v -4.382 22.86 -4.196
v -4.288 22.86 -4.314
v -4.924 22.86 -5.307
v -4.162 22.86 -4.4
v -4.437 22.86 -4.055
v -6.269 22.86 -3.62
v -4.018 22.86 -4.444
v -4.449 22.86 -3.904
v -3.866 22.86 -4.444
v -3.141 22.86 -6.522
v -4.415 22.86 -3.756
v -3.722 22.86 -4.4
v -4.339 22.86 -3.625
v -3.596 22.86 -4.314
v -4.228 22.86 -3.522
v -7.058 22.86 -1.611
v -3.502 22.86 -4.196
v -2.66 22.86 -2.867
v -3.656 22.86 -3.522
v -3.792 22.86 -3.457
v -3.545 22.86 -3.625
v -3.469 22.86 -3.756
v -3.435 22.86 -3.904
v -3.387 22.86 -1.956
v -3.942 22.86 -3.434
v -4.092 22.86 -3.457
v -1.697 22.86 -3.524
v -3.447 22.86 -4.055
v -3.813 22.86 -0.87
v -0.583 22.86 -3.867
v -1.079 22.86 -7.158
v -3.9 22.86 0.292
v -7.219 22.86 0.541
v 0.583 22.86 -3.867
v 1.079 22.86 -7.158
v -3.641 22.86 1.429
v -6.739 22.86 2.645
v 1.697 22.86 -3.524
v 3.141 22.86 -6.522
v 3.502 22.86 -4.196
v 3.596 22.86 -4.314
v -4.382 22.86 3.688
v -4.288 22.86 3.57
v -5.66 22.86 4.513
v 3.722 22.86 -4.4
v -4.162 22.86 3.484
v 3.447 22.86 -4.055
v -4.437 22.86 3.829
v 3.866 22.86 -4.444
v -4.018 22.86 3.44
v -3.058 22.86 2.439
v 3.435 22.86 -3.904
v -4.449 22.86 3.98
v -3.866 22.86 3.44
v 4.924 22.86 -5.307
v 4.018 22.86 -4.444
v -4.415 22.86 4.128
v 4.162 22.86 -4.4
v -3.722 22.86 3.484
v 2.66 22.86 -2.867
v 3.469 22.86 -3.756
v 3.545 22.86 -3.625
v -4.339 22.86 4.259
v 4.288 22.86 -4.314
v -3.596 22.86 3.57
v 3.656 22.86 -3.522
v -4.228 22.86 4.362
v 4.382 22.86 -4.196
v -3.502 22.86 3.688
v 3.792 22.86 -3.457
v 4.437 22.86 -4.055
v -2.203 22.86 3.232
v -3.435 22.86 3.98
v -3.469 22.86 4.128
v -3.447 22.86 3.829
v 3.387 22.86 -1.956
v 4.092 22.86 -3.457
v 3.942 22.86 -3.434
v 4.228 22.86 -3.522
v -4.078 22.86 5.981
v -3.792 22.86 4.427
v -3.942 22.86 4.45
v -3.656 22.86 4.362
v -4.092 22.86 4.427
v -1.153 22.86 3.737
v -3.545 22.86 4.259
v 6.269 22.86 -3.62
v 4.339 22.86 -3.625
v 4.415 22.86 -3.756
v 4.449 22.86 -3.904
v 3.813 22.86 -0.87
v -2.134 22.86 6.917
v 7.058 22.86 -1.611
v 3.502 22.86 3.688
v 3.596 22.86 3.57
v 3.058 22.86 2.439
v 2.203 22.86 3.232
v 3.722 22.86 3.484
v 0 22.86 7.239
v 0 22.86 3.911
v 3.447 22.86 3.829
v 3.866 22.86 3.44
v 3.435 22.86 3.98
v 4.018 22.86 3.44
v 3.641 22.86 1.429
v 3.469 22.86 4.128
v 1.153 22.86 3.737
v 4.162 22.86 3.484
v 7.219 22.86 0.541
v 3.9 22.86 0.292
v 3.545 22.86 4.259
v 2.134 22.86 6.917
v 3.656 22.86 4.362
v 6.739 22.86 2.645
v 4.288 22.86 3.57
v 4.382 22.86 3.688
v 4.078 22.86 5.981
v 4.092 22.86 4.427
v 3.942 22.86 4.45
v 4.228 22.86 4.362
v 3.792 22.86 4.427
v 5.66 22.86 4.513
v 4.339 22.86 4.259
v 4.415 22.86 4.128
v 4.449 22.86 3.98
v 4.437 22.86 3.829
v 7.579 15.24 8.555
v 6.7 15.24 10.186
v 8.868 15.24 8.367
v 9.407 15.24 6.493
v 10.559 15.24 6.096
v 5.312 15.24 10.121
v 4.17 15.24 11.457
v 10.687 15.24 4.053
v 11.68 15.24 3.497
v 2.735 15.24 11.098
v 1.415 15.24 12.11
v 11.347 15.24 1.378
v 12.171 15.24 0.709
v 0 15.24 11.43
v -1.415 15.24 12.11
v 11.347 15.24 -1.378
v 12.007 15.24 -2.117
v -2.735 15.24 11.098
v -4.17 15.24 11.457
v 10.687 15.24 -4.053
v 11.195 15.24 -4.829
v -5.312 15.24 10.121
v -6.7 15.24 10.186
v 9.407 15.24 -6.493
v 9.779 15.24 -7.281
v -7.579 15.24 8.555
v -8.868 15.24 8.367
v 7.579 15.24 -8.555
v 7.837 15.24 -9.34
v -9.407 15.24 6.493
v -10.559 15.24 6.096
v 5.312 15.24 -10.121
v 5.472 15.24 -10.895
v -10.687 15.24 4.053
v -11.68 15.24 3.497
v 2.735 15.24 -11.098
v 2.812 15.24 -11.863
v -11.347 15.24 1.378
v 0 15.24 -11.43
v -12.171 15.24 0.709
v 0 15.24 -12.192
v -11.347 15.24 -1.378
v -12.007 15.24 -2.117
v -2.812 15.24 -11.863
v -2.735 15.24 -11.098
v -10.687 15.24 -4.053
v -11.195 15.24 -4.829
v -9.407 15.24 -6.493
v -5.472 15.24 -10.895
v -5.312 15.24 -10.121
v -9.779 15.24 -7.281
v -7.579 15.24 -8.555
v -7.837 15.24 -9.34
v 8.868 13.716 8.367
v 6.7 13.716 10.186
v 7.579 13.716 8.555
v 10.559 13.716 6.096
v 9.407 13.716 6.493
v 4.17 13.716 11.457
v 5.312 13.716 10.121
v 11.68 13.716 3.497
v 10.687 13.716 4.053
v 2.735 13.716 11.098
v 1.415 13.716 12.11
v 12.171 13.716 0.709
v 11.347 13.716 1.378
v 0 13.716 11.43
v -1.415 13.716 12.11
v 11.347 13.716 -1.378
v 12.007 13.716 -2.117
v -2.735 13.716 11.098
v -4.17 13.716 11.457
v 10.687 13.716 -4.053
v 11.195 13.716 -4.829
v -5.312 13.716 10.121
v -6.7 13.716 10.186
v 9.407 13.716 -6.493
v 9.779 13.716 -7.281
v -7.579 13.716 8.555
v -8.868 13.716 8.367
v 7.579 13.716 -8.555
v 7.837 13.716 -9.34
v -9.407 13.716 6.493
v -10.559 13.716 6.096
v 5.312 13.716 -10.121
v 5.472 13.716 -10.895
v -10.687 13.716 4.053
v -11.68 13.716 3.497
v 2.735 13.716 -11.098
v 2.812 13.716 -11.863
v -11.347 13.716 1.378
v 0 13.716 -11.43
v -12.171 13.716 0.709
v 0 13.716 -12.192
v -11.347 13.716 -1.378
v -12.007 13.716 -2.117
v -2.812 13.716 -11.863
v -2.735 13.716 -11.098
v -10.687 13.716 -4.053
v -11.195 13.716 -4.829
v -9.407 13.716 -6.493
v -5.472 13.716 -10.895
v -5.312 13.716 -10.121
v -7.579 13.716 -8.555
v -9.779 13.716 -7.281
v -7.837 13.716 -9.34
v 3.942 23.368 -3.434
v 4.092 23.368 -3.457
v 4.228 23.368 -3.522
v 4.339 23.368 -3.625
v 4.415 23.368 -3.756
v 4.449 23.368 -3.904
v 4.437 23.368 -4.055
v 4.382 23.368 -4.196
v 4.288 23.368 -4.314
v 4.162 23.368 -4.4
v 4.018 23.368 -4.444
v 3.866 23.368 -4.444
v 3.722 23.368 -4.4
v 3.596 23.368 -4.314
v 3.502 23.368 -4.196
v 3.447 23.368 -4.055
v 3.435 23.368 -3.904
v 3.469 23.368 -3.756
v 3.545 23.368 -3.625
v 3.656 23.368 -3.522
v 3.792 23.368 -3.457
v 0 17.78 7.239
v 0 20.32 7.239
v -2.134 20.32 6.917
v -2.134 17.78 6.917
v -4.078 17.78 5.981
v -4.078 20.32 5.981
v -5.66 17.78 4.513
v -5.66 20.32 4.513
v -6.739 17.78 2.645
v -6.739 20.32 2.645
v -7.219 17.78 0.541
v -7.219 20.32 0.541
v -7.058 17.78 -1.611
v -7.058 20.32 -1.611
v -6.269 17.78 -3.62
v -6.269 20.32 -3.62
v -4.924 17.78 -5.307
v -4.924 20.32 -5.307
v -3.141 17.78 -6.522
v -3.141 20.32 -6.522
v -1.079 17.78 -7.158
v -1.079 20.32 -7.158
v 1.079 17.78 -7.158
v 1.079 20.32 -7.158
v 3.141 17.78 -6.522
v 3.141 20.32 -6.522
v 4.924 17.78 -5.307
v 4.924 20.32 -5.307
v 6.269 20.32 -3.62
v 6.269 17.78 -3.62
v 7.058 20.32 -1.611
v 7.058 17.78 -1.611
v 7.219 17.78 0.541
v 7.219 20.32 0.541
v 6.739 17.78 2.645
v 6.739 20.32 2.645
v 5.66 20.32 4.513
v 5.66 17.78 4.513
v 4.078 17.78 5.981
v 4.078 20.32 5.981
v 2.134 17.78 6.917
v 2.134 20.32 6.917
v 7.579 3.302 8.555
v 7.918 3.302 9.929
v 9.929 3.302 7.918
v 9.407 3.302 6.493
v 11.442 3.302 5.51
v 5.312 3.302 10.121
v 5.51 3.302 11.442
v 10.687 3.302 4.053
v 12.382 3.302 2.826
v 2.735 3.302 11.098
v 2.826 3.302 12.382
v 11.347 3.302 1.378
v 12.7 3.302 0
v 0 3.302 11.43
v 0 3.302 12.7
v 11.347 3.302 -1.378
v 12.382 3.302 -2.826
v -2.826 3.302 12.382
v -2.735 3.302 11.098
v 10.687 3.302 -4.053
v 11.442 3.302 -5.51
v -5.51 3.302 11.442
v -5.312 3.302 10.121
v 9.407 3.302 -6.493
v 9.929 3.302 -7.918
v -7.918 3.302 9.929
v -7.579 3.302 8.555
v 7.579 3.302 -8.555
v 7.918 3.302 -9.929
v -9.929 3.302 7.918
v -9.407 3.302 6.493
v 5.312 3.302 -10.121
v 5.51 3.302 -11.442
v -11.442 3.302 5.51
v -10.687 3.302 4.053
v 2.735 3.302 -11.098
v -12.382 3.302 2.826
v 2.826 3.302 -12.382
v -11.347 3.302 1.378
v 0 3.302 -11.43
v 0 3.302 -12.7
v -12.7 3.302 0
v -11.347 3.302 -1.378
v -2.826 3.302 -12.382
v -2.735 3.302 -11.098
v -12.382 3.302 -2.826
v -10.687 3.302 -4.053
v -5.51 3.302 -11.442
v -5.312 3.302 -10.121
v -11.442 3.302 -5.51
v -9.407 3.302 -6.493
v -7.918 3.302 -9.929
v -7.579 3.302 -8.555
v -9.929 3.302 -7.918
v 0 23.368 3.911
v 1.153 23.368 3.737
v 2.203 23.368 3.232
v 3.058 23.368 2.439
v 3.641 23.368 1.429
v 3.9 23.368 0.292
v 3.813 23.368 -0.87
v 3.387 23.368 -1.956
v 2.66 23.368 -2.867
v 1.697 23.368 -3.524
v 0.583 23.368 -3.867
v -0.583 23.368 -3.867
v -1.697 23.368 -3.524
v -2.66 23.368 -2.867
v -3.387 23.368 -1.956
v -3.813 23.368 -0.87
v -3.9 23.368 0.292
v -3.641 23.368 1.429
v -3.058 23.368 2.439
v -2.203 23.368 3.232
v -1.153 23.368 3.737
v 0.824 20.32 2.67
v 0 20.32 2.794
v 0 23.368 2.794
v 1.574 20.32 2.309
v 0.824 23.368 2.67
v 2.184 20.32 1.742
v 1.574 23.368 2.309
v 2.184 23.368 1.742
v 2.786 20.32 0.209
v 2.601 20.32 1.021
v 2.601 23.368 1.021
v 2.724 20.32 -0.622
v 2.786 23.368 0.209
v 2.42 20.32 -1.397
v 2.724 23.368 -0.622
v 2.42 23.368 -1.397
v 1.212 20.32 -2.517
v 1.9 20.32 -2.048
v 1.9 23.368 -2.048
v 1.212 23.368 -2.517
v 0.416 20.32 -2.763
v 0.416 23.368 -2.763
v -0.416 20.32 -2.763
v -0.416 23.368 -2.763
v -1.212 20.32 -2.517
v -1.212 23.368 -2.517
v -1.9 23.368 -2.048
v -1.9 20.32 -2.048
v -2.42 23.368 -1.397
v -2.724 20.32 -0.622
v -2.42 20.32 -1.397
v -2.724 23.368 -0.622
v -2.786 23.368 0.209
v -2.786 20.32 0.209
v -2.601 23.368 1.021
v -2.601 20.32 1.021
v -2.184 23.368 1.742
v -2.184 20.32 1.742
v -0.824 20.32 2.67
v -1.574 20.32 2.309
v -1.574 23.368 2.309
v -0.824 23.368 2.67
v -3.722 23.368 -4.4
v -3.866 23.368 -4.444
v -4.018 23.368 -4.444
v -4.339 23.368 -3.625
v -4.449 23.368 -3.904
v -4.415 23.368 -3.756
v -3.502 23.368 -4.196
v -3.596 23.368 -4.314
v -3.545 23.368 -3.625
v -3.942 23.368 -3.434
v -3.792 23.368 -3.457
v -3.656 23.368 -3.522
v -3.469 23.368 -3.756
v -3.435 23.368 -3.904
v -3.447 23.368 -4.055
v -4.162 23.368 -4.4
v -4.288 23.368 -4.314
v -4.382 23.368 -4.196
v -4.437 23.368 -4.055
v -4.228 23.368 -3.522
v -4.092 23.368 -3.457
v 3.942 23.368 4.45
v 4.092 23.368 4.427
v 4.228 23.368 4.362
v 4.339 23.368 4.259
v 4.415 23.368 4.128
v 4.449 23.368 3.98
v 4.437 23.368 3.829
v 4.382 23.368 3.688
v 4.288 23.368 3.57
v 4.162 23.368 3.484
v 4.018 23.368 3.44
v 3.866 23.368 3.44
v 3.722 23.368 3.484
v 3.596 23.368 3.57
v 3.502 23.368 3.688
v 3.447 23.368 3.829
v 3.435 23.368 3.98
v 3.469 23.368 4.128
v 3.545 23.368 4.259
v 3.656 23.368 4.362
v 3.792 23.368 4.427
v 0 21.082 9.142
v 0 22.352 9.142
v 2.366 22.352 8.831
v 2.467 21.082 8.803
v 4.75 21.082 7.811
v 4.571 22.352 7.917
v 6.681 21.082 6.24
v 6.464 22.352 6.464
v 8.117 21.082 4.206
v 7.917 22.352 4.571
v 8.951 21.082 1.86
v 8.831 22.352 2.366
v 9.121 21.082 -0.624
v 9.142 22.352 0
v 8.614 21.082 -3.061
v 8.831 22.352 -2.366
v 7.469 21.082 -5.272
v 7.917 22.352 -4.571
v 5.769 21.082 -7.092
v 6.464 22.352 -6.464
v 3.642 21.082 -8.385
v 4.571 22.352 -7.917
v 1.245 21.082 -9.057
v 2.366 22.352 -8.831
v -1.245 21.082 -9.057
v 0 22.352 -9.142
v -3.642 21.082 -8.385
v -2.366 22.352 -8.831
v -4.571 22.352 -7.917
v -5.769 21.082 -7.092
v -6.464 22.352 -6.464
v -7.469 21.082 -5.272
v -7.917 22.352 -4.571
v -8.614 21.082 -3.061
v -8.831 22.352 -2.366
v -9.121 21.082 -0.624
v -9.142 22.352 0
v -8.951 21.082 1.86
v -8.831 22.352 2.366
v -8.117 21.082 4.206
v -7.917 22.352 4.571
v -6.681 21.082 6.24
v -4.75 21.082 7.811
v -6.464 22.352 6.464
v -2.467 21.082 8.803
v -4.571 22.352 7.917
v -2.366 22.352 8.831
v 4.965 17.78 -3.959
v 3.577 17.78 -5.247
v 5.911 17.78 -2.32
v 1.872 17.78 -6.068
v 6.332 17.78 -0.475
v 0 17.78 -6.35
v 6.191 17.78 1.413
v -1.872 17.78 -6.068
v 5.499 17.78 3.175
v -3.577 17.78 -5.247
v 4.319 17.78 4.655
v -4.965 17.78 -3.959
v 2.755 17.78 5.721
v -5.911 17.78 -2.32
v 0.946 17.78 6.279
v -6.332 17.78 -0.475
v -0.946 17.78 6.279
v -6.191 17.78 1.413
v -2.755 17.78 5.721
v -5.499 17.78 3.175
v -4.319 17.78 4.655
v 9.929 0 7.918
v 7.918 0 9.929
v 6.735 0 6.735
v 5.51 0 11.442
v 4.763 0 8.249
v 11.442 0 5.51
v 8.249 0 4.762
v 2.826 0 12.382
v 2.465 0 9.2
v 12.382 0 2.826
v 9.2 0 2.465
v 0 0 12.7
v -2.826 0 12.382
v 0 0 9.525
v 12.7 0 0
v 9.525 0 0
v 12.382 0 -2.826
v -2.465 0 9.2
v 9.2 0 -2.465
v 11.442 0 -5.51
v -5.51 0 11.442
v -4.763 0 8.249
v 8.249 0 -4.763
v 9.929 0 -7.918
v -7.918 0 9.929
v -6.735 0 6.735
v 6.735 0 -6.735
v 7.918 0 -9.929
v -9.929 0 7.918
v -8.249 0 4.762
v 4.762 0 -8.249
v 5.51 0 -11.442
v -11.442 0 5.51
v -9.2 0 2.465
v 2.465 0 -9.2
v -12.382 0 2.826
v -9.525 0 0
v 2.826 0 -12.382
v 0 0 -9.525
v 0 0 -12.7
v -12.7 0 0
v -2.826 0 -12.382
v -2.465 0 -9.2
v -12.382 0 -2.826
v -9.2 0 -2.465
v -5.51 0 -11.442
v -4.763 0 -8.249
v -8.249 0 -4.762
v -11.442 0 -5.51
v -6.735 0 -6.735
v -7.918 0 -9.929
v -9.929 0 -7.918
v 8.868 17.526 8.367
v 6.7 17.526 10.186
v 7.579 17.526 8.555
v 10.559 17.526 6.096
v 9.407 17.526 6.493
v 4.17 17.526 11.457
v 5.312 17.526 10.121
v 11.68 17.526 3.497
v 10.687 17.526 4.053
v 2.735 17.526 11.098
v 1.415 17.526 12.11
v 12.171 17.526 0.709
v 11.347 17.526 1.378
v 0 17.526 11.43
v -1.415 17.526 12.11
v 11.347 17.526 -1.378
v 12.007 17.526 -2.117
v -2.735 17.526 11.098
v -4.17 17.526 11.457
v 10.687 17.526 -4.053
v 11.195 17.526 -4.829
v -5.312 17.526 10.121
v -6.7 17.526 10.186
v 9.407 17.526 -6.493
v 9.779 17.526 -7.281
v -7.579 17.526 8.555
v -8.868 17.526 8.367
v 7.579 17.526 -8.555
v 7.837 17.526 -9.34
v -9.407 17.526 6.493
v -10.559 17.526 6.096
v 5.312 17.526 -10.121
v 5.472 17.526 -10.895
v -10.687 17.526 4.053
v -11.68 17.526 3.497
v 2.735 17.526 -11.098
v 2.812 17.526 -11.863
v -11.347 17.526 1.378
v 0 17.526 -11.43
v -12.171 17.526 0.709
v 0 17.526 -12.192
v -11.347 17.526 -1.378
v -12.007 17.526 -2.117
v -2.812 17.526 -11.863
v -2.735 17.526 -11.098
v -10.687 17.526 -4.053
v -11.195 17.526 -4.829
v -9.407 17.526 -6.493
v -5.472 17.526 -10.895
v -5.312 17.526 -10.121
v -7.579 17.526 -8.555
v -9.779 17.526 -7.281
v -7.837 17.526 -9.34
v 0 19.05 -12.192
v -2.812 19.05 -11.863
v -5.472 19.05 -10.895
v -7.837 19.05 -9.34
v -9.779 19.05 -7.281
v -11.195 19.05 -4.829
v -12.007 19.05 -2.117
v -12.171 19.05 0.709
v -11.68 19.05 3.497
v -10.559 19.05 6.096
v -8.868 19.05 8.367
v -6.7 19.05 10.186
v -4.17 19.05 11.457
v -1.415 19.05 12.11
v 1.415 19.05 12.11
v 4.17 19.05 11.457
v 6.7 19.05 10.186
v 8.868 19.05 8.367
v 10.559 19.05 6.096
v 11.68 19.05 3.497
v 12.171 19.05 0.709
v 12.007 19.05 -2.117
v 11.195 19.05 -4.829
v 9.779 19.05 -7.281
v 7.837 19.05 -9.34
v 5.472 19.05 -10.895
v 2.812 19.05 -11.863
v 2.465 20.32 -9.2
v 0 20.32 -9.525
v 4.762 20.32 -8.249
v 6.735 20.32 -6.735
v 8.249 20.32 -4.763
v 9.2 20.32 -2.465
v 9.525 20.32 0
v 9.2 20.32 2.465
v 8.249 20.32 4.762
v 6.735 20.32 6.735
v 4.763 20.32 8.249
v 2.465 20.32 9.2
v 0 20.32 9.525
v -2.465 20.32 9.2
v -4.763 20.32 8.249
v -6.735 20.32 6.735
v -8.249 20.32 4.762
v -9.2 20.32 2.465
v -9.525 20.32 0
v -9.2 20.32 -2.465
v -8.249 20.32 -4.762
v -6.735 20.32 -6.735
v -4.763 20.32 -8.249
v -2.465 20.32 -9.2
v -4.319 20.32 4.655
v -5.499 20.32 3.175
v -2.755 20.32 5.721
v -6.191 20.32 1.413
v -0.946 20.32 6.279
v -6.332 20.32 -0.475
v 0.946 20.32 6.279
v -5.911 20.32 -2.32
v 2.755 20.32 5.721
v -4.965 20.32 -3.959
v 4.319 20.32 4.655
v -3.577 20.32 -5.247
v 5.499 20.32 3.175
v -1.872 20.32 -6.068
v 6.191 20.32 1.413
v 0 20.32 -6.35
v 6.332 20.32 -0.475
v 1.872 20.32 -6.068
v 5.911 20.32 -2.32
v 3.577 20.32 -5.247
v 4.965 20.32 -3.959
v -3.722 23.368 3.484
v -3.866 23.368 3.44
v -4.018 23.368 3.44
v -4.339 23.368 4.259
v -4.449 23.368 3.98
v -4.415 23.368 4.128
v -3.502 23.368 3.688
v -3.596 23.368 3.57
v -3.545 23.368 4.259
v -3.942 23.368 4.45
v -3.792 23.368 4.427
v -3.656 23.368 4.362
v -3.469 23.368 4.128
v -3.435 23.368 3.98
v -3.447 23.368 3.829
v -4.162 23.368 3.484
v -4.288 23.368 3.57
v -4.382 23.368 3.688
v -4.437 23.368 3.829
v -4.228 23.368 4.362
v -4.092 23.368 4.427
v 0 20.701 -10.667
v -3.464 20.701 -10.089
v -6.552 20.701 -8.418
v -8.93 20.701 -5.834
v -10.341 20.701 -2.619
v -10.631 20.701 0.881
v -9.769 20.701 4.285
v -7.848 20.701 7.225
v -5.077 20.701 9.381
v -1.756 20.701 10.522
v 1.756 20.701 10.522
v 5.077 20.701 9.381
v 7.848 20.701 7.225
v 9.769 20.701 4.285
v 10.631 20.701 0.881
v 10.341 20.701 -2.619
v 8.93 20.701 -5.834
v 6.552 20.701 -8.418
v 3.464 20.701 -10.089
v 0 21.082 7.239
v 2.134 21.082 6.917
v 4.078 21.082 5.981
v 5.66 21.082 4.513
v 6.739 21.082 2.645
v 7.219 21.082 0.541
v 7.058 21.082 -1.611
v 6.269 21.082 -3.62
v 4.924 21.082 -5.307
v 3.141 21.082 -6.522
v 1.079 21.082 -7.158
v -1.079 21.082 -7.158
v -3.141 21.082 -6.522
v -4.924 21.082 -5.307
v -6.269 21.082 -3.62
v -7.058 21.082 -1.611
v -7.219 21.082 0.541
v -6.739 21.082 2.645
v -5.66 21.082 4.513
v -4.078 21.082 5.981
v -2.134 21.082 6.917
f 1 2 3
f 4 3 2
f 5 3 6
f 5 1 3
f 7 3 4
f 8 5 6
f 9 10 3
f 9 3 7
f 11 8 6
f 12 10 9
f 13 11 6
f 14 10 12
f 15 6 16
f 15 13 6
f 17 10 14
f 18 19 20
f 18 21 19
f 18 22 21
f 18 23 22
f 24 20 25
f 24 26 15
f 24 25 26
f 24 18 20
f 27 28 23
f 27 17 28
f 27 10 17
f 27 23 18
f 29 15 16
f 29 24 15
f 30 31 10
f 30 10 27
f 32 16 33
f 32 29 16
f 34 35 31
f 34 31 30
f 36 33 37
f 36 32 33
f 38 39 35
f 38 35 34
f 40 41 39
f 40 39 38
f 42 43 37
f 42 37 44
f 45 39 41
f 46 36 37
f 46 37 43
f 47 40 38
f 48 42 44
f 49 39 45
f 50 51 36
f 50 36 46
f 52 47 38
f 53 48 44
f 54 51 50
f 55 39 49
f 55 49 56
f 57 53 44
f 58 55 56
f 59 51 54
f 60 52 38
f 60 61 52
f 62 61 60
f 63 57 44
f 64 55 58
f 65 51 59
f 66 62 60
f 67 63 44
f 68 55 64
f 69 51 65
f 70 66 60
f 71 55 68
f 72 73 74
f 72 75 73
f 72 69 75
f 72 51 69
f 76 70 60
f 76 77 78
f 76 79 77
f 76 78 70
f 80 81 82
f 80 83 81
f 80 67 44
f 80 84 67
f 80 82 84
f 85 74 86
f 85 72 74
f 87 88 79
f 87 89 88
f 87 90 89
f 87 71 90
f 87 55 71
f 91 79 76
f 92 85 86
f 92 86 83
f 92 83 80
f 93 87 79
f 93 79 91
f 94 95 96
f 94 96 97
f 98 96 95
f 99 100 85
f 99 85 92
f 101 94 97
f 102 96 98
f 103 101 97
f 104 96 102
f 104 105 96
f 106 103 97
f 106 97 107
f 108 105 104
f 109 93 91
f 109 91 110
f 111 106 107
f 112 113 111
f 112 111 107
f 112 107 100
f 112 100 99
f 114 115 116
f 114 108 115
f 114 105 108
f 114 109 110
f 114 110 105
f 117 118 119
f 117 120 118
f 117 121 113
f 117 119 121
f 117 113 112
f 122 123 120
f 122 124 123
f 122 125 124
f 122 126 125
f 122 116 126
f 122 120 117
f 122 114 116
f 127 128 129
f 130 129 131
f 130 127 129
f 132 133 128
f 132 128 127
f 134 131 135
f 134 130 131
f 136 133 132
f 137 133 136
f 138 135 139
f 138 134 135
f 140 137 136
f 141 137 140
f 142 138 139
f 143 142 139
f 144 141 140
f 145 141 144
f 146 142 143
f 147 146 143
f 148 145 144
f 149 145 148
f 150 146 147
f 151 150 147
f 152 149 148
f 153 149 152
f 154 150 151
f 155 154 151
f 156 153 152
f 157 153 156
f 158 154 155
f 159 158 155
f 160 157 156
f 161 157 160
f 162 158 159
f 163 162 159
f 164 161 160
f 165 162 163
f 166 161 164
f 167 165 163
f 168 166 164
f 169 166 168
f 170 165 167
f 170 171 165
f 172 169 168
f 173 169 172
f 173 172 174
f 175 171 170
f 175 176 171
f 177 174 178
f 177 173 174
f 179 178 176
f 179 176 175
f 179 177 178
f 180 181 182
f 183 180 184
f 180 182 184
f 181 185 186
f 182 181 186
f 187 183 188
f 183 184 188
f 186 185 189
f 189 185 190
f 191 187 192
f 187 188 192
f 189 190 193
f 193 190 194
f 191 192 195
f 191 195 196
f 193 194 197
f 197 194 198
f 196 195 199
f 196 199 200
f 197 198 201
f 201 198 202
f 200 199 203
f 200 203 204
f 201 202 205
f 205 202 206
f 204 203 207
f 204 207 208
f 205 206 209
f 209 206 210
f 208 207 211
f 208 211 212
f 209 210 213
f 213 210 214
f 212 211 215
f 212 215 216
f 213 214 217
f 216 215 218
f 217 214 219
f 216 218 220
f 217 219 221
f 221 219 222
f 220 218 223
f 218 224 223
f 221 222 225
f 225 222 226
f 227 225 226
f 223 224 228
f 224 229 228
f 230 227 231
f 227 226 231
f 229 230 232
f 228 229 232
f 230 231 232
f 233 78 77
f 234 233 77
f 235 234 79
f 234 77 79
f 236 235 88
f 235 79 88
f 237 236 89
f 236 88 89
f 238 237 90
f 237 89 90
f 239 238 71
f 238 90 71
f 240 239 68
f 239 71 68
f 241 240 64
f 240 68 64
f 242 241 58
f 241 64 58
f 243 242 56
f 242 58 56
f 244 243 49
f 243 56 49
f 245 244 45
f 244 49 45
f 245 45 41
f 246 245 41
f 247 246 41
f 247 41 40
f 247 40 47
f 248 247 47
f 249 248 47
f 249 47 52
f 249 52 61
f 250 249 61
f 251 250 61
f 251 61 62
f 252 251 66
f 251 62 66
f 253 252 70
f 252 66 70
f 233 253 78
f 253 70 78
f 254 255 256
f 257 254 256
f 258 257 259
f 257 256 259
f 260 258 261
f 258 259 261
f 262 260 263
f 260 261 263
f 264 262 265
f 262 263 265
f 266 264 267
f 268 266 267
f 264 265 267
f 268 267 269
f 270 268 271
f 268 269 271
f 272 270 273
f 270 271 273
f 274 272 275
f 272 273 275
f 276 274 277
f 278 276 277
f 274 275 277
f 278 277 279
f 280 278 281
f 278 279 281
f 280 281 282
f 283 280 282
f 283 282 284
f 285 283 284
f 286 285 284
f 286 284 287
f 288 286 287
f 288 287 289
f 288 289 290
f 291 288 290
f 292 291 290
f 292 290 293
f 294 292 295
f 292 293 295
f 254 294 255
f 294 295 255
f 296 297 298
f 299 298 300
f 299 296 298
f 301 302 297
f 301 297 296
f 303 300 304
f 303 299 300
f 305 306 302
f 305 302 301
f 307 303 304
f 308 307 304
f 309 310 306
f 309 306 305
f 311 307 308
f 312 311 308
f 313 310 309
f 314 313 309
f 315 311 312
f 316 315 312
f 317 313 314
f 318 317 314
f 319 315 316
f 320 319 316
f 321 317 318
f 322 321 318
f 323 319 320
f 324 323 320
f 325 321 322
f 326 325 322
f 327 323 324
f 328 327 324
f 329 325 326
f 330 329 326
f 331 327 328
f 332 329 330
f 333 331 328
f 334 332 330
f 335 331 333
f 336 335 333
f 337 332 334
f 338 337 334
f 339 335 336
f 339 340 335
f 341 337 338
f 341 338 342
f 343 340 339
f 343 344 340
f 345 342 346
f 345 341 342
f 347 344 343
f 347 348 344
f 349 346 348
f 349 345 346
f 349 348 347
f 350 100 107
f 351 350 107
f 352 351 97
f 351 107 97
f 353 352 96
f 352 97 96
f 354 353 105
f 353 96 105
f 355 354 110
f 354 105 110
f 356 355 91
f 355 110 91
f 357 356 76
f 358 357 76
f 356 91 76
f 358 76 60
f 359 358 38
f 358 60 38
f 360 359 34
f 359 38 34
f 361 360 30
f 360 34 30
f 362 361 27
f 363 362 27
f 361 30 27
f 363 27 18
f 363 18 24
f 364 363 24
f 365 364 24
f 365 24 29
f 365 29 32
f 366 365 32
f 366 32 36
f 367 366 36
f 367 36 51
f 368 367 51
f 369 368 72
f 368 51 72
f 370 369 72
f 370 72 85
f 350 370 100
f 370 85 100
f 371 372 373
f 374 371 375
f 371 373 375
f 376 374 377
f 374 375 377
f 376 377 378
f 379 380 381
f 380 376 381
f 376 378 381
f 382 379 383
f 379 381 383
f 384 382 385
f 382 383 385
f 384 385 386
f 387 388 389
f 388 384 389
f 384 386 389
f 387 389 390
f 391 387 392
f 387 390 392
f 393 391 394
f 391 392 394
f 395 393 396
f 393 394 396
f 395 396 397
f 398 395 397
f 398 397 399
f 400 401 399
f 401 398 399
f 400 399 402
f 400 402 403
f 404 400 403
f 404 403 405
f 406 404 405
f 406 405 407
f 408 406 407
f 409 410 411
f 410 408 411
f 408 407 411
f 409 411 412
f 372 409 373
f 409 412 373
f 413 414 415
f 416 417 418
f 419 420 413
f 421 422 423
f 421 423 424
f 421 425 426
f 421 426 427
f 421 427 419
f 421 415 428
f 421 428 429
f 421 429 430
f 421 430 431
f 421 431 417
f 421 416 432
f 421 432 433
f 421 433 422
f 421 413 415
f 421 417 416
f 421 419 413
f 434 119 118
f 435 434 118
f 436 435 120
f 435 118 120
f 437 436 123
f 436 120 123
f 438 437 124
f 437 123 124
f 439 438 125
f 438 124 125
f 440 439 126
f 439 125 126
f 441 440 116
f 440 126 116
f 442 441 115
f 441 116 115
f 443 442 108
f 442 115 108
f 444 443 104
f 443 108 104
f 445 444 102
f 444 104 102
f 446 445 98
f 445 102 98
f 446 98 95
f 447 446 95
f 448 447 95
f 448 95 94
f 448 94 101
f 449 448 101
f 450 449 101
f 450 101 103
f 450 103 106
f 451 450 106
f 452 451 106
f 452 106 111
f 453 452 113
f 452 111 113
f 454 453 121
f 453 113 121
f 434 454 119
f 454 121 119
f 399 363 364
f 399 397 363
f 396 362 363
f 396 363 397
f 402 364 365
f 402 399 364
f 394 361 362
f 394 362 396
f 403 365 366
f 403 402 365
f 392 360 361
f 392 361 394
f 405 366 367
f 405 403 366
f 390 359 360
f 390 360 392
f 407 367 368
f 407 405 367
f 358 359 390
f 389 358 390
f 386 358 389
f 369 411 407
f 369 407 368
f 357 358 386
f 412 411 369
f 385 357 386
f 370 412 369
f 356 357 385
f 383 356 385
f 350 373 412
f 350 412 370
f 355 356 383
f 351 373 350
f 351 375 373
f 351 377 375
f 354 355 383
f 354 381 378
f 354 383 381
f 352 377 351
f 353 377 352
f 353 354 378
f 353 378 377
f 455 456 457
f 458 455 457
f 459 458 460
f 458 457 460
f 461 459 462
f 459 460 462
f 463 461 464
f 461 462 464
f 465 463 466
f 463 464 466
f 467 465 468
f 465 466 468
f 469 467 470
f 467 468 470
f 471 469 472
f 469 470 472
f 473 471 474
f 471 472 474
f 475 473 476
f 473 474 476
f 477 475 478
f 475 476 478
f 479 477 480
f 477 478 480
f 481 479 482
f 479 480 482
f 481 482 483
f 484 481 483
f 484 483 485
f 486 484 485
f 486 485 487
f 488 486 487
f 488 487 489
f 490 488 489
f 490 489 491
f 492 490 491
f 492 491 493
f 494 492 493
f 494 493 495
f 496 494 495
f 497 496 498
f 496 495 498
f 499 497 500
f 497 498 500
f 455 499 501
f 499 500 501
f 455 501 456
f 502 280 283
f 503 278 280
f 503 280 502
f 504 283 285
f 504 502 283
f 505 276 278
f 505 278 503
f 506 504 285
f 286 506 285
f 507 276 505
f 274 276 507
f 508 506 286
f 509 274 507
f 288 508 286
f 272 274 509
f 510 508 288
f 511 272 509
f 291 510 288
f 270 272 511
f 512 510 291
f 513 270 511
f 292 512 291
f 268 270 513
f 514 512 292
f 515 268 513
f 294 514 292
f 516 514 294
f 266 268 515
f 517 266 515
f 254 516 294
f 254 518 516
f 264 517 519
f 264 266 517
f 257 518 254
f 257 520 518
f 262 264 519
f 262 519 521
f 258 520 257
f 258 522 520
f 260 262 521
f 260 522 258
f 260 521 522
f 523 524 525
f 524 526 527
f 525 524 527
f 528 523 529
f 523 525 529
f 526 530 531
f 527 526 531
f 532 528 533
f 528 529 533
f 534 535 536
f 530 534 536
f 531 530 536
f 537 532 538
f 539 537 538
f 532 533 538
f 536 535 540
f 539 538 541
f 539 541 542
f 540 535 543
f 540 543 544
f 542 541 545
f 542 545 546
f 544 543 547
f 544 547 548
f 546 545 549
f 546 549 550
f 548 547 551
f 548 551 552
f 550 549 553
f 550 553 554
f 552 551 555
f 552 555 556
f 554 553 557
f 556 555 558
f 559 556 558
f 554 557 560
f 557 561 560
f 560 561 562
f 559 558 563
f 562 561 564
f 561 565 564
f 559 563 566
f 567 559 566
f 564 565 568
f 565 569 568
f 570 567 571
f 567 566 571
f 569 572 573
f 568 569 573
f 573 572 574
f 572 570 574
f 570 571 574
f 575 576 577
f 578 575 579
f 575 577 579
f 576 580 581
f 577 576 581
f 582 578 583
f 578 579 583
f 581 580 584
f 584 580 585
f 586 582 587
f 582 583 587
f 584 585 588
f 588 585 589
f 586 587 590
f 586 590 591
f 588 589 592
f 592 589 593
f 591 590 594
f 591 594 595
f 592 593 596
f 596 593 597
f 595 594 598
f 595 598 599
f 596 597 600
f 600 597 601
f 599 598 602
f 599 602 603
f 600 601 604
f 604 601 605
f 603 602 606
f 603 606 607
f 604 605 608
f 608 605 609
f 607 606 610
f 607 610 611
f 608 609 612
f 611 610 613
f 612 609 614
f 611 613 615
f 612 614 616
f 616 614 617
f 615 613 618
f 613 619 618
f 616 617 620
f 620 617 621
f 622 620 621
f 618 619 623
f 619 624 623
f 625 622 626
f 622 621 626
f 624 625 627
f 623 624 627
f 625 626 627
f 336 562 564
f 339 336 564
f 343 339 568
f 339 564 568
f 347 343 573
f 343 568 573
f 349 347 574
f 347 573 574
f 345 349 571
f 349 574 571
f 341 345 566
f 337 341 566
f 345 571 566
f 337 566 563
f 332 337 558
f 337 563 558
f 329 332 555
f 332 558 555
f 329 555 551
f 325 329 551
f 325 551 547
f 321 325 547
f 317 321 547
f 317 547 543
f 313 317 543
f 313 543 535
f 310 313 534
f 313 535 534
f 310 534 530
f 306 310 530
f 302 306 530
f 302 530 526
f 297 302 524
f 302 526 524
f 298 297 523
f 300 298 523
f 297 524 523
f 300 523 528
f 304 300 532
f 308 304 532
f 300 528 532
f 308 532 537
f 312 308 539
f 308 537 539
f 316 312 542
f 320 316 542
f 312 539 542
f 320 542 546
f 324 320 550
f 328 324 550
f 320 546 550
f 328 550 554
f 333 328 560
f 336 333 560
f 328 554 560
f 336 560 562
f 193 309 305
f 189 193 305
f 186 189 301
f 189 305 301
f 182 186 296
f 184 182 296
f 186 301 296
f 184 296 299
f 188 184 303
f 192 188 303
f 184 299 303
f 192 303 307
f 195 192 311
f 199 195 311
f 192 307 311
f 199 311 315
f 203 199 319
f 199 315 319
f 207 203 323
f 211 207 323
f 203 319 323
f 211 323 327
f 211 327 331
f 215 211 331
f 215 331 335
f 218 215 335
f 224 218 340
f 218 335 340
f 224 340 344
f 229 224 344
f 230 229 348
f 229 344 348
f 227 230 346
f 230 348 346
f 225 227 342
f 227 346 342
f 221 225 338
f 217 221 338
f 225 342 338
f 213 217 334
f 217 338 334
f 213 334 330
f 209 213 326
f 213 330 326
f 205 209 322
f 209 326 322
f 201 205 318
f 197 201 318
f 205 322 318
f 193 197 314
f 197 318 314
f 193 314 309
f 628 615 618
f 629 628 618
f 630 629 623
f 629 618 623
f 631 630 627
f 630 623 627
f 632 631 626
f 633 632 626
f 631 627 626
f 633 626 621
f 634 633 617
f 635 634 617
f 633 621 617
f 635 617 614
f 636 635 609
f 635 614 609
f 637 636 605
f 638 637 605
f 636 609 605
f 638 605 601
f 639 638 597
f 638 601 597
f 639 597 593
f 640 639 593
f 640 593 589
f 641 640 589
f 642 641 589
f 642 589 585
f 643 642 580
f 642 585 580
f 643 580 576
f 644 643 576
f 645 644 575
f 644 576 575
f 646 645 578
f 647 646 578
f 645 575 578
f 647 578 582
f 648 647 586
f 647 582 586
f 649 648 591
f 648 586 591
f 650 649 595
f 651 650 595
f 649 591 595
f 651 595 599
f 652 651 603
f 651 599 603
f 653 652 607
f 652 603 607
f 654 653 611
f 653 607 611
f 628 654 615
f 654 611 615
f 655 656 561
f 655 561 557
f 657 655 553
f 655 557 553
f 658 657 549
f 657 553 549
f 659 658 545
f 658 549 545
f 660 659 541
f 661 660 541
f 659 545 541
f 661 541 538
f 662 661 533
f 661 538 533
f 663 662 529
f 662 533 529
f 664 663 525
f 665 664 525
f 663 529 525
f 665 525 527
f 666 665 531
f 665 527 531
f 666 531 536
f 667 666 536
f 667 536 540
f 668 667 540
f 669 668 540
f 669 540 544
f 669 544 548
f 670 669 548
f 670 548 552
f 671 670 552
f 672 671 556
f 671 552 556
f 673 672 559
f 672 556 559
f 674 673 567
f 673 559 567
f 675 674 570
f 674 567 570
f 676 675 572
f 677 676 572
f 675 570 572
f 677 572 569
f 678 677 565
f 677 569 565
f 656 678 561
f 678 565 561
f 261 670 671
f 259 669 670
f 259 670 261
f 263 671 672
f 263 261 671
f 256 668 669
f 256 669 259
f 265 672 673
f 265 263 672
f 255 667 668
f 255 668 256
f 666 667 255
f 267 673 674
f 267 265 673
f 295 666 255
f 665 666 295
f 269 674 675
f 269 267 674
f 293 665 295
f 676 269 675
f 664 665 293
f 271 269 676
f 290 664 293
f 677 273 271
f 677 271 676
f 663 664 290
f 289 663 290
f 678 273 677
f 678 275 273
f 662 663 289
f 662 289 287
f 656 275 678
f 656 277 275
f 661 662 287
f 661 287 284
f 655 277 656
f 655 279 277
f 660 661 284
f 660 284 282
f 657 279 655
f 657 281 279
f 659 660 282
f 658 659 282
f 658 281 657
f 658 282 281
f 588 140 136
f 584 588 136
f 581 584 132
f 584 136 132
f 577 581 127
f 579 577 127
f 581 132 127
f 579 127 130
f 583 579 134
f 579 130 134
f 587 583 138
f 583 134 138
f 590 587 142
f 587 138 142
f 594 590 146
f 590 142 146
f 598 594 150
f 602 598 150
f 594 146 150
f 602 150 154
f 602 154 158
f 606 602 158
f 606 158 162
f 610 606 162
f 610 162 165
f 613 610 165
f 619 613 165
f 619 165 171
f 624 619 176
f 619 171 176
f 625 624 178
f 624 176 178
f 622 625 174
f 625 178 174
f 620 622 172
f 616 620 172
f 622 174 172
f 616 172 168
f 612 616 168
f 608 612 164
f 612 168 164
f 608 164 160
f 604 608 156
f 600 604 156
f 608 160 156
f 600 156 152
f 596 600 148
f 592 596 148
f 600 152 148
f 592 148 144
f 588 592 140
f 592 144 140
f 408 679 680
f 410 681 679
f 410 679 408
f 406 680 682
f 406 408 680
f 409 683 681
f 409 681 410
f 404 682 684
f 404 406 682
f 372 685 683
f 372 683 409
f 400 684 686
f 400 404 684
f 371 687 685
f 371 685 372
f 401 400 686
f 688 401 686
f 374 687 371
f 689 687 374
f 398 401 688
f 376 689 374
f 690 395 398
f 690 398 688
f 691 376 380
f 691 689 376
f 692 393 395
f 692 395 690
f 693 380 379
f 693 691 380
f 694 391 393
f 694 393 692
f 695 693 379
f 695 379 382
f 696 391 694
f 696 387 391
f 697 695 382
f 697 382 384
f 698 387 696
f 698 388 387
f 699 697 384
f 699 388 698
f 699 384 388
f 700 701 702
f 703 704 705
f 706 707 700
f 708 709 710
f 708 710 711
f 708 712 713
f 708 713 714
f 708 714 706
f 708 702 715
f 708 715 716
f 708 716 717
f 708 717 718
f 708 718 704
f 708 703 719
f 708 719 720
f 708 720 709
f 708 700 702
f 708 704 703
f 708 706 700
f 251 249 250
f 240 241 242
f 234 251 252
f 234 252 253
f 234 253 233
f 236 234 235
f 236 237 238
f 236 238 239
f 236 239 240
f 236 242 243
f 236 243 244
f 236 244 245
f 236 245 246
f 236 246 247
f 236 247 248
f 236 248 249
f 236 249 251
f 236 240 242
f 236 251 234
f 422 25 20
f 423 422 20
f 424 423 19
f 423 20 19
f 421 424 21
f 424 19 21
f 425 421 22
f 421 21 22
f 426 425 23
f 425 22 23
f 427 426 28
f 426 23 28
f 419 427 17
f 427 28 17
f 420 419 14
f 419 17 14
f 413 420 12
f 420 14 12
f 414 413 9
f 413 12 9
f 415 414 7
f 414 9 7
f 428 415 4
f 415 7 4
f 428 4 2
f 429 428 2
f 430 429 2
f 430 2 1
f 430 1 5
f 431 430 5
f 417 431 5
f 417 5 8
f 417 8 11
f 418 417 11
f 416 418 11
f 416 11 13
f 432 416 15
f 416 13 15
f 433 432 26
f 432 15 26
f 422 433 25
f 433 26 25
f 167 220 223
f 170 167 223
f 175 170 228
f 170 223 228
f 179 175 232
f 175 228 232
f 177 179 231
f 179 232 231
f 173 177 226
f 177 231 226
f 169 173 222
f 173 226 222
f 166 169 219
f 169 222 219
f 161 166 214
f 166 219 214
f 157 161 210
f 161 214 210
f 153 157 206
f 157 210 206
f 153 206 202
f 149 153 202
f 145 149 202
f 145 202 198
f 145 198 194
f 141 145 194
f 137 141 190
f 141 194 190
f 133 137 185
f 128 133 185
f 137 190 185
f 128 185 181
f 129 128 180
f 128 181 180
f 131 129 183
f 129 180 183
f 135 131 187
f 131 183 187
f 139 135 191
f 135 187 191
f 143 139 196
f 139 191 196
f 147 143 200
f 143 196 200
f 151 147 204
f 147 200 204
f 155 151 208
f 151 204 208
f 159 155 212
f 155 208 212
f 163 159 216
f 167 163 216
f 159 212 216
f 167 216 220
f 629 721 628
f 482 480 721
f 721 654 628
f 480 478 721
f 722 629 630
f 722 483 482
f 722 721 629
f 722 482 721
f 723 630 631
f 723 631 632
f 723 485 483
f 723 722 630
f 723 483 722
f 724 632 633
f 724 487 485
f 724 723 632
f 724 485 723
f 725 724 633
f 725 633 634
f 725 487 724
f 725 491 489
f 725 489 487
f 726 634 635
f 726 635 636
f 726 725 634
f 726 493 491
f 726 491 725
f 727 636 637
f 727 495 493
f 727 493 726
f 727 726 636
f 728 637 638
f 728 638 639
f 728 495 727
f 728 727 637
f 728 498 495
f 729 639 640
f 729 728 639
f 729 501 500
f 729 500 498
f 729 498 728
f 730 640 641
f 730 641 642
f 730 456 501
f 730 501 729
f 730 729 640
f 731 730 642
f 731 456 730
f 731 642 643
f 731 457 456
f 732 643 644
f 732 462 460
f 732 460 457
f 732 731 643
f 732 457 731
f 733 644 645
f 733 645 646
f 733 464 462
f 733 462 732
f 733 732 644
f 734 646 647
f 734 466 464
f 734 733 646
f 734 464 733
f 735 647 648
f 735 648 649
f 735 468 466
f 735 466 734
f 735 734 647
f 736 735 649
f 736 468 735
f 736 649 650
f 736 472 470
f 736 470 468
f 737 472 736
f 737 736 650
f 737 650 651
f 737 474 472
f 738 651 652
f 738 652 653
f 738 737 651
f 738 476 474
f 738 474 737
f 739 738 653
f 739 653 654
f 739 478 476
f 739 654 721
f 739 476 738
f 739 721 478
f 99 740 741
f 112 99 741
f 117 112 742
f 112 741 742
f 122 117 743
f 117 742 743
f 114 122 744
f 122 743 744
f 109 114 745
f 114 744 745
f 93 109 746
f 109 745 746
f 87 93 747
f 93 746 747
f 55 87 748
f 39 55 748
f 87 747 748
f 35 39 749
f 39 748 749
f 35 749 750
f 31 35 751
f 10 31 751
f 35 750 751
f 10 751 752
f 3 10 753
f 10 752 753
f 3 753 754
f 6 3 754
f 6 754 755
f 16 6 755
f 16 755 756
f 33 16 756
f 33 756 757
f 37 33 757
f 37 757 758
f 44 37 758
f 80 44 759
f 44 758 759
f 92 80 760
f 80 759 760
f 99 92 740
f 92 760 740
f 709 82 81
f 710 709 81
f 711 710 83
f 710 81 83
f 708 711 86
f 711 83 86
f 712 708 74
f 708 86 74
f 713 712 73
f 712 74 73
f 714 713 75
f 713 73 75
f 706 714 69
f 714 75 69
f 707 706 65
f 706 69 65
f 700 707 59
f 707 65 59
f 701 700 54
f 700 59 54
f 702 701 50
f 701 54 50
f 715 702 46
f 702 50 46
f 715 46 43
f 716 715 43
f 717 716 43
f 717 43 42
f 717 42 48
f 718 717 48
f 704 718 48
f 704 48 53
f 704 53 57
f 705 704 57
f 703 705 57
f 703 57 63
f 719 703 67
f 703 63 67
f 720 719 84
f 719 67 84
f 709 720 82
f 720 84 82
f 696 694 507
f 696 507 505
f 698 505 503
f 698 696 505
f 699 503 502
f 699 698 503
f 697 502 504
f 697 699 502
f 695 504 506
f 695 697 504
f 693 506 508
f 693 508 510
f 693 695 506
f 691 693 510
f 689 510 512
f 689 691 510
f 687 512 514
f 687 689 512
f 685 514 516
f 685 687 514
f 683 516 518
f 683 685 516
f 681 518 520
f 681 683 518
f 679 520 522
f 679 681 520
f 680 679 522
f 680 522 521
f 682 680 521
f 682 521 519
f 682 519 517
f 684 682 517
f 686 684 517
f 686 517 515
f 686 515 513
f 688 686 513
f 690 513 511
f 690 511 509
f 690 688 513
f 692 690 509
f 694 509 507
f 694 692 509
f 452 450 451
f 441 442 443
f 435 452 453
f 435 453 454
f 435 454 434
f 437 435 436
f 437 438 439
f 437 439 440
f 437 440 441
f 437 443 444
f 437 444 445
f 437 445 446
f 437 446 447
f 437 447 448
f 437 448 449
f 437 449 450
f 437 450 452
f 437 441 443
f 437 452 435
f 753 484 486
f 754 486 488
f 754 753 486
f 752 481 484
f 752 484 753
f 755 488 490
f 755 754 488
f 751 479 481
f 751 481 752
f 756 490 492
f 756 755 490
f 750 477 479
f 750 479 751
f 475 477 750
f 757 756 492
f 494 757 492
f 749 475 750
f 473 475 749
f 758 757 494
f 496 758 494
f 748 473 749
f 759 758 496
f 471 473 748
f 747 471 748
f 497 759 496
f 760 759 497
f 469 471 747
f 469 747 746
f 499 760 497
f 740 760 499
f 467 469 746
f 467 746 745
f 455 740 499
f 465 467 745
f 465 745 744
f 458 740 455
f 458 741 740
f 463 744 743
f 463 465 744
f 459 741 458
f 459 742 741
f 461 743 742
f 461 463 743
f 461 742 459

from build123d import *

# Parameters (mm, degrees)
SKETCH1_R               = 12.7
BOTTOM_LIP_DEPTH        = 3.302
SKETCH2_R               = 11.43
BOSS_EXTRUDE3_DEPTH     = 10.414
SKETCH3_R               = 12.192
BOSS_EXTRUDE4_DEPTH     = 1.524
SKETCH4_R               = 11.43
BOSS_EXTRUDE5_DEPTH     = 2.286
SKETCH5_R               = 12.192
BOSS_EXTRUDE7_DEPTH     = 1.524
SKETCH6_R               = 12.192
BOSS_EXTRUDE8_DEPTH     = 3.302
BOSS_EXTRUDE8_TAPER     = 42.72727272
SKETCH12_R              = 7.239
BOSS_EXTRUDE9_DEPTH     = 0.508
SKETCH13_R              = 9.14209071
CUT_EXTRUDE2_DEPTH      = 1.27
SKETCH14_R              = 7.239
BOSS_EXTRUDE10_DEPTH    = 1.778
CUT_EXTRUDE3_DEPTH      = 30.071628781
CUT_EXTRUDE3_DEPTH_BACK = 30.071628781
SKETCH15_R              = 2.794
SKETCH16_R              = 9.525
CUT_EXTRUDE4_DEPTH      = 20.32
SKETCH17_R              = 7.239
SKETCH17_R_2            = 6.35
BOSS_EXTRUDE11_DEPTH    = 2.54
SKETCH18_R              = 3.911149558
BOSS_EXTRUDE15_DEPTH    = 0.508
SKETCH19_R              = 2.794
CUT_EXTRUDE5_DEPTH      = 30.472757319
SKETCH20_R              = 0.508
BOSS_EXTRUDE16_DEPTH    = 0.508


with BuildPart() as part:
    # Sketch1 → Bottom_Lip (new body)
    with BuildSketch(Plane(origin=(0, 0, 0), x_dir=(1, 0, 0), z_dir=(0, 1, 0))):
        with Locations(Location((0, 0, 0), (0, 0, 90))):
            Circle(SKETCH1_R)
    extrude(amount=BOTTOM_LIP_DEPTH)

    # Sketch2 → Boss-Extrude3 (add)
    with BuildSketch(Plane(origin=(0, 3.302, 0), x_dir=(1, 0, 0), z_dir=(0, 1, 0))):
        with Locations(Location((0, 0, 0), (0, 0, 270))):
            Circle(SKETCH2_R)
    extrude(amount=BOSS_EXTRUDE3_DEPTH)

    # Sketch3 → Boss-Extrude4 (add)
    with BuildSketch(Plane(origin=(0, 13.716, 0), x_dir=(1, 0, 0), z_dir=(0, 1, 0))):
        with Locations(Location((0, 0, 0), (0, 0, 90))):
            Circle(SKETCH3_R)
    extrude(amount=BOSS_EXTRUDE4_DEPTH)

    # Sketch4 → Boss-Extrude5 (add)
    with BuildSketch(Plane(origin=(0, 15.24, 0), x_dir=(1, 0, 0), z_dir=(0, 1, 0))):
        with Locations(Location((0, 0, 0), (0, 0, 270))):
            Circle(SKETCH4_R)
    extrude(amount=BOSS_EXTRUDE5_DEPTH)

    # Sketch5 → Boss-Extrude7 (add)
    with BuildSketch(Plane(origin=(0, 17.526, 0), x_dir=(1, 0, 0), z_dir=(0, 1, 0))):
        with Locations(Location((0, 0, 0), (0, 0, 90))):
            Circle(SKETCH5_R)
    extrude(amount=BOSS_EXTRUDE7_DEPTH)


with BuildPart() as body_2:
    # Sketch6 → Boss-Extrude8 (new body)
    with BuildSketch(Plane(origin=(0, 19.05, 0), x_dir=(1, 0, 0), z_dir=(0, 1, 0))):
        with Locations(Location((0, 0, 0), (0, 0, 90))):
            Circle(SKETCH6_R)
    extrude(amount=BOSS_EXTRUDE8_DEPTH, taper=BOSS_EXTRUDE8_TAPER)

    # Sketch12 → Boss-Extrude9 (add)
    with BuildSketch(Plane(origin=(0, 22.352, 0), x_dir=(1, 0, 0), z_dir=(0, 1, 0))):
        with Locations(Location((0, 0, 0), (0, 0, 270))):
            Circle(SKETCH12_R)
    extrude(amount=BOSS_EXTRUDE9_DEPTH)

    # Sketch13 → Cut-Extrude2 (cut)
    with BuildSketch(Plane(origin=(0, 22.352, 0), x_dir=(1, 0, 0), z_dir=(0, 1, 0))):
        with Locations(Location((0, 0, 0), (0, 0, 270))):
            Circle(SKETCH13_R)
    extrude(amount=-CUT_EXTRUDE2_DEPTH, mode=Mode.SUBTRACT)


with BuildPart() as body_3:
    # of the pieces the cut leaves, the one that is kept (cut_extrude2_keep)
    add(body_2.part.solids().sort_by_distance((0, 19.05, -12.192))[0])

    # Sketch14 → Boss-Extrude10 (add)
    with BuildSketch(Plane(origin=(0, 21.082, 0), x_dir=(1, 0, 0), z_dir=(0, 1, 0))):
        with Locations(Location((0, 0, 0), (0, 0, 270))):
            Circle(SKETCH14_R)
    extrude(amount=BOSS_EXTRUDE10_DEPTH)

    # Sketch15 → Cut-Extrude3 (cut, two sides: drawn at the far end of the back side and taken through both)
    with BuildSketch(Plane(origin=(0, 22.86, 0), x_dir=(1, 0, 0), z_dir=(0, 1, 0)).offset(-CUT_EXTRUDE3_DEPTH_BACK)):
        with Locations(Location((0, 0, 0), (0, 0, 270))):
            Circle(SKETCH15_R)
    extrude(amount=CUT_EXTRUDE3_DEPTH + CUT_EXTRUDE3_DEPTH_BACK, mode=Mode.SUBTRACT)


with BuildPart() as cut_extrude4_tool:
    # Sketch16 → Cut-Extrude4 (new body)
    with BuildSketch(Plane.XZ):
        with Locations(Location((0, 0, 0), (0, 0, 270))):
            Circle(SKETCH16_R)
    extrude(amount=-CUT_EXTRUDE4_DEPTH)


with BuildPart() as part_1:
    add(part.part)

    # Cut-Extrude4: cut by cut_extrude4_tool
    add(cut_extrude4_tool.part, mode=Mode.SUBTRACT)



with BuildPart() as body_3_1:
    add(body_3.part)

    # Cut-Extrude4: cut by cut_extrude4_tool
    add(cut_extrude4_tool.part, mode=Mode.SUBTRACT)


with BuildPart() as part_2:
    add(part_1.part)

    add(body_3_1.part)  # Boss-Extrude11 merges body 3
    # Sketch17 → Boss-Extrude11 (add)
    with BuildSketch(Plane.XZ.offset(-20.32)):
        with Locations(Location((0, 0, 0), (0, 0, 90))):
            Circle(SKETCH17_R)
        with Locations(Location((0, 0, 0), (0, 0, 270))):
            Circle(SKETCH17_R_2, mode=Mode.SUBTRACT)
    extrude(amount=BOSS_EXTRUDE11_DEPTH)

    # Sketch18 → Boss-Extrude15 (add)
    with BuildSketch(Plane(origin=(0, 22.86, 0), x_dir=(1, 0, 0), z_dir=(0, 1, 0))):
        with Locations(Location((0, 0, 0), (0, 0, 270))):
            Circle(SKETCH18_R)
    extrude(amount=BOSS_EXTRUDE15_DEPTH)

    # Sketch19 → Cut-Extrude5 (cut, through all)
    with BuildSketch(Plane(origin=(0, 23.368, 0), x_dir=(1, 0, 0), z_dir=(0, 1, 0))):
        with Locations(Location((0, 0, 0), (0, 0, 270))):
            Circle(SKETCH19_R)
    extrude(amount=-CUT_EXTRUDE5_DEPTH, mode=Mode.SUBTRACT)

    # Sketch20 → Boss-Extrude16 (add)
    with BuildSketch(Plane(origin=(0, 22.86, 0), x_dir=(1, 0, 0), z_dir=(0, 1, 0))):
        with Locations(Location((3.942013927, -3.942013927, 0), (0, 0, 270))):
            Circle(SKETCH20_R)
        with Locations(Location((-3.942013927, -3.942013927, 0), (0, 0, 270))):
            Circle(SKETCH20_R)
        with Locations(Location((-3.942013927, 3.942013927, 0), (0, 0, 270))):
            Circle(SKETCH20_R)
        with Locations(Location((3.942013927, 3.942013927, 0), (0, 0, 270))):
            Circle(SKETCH20_R)
    extrude(amount=BOSS_EXTRUDE16_DEPTH)


solid = part_2.part
